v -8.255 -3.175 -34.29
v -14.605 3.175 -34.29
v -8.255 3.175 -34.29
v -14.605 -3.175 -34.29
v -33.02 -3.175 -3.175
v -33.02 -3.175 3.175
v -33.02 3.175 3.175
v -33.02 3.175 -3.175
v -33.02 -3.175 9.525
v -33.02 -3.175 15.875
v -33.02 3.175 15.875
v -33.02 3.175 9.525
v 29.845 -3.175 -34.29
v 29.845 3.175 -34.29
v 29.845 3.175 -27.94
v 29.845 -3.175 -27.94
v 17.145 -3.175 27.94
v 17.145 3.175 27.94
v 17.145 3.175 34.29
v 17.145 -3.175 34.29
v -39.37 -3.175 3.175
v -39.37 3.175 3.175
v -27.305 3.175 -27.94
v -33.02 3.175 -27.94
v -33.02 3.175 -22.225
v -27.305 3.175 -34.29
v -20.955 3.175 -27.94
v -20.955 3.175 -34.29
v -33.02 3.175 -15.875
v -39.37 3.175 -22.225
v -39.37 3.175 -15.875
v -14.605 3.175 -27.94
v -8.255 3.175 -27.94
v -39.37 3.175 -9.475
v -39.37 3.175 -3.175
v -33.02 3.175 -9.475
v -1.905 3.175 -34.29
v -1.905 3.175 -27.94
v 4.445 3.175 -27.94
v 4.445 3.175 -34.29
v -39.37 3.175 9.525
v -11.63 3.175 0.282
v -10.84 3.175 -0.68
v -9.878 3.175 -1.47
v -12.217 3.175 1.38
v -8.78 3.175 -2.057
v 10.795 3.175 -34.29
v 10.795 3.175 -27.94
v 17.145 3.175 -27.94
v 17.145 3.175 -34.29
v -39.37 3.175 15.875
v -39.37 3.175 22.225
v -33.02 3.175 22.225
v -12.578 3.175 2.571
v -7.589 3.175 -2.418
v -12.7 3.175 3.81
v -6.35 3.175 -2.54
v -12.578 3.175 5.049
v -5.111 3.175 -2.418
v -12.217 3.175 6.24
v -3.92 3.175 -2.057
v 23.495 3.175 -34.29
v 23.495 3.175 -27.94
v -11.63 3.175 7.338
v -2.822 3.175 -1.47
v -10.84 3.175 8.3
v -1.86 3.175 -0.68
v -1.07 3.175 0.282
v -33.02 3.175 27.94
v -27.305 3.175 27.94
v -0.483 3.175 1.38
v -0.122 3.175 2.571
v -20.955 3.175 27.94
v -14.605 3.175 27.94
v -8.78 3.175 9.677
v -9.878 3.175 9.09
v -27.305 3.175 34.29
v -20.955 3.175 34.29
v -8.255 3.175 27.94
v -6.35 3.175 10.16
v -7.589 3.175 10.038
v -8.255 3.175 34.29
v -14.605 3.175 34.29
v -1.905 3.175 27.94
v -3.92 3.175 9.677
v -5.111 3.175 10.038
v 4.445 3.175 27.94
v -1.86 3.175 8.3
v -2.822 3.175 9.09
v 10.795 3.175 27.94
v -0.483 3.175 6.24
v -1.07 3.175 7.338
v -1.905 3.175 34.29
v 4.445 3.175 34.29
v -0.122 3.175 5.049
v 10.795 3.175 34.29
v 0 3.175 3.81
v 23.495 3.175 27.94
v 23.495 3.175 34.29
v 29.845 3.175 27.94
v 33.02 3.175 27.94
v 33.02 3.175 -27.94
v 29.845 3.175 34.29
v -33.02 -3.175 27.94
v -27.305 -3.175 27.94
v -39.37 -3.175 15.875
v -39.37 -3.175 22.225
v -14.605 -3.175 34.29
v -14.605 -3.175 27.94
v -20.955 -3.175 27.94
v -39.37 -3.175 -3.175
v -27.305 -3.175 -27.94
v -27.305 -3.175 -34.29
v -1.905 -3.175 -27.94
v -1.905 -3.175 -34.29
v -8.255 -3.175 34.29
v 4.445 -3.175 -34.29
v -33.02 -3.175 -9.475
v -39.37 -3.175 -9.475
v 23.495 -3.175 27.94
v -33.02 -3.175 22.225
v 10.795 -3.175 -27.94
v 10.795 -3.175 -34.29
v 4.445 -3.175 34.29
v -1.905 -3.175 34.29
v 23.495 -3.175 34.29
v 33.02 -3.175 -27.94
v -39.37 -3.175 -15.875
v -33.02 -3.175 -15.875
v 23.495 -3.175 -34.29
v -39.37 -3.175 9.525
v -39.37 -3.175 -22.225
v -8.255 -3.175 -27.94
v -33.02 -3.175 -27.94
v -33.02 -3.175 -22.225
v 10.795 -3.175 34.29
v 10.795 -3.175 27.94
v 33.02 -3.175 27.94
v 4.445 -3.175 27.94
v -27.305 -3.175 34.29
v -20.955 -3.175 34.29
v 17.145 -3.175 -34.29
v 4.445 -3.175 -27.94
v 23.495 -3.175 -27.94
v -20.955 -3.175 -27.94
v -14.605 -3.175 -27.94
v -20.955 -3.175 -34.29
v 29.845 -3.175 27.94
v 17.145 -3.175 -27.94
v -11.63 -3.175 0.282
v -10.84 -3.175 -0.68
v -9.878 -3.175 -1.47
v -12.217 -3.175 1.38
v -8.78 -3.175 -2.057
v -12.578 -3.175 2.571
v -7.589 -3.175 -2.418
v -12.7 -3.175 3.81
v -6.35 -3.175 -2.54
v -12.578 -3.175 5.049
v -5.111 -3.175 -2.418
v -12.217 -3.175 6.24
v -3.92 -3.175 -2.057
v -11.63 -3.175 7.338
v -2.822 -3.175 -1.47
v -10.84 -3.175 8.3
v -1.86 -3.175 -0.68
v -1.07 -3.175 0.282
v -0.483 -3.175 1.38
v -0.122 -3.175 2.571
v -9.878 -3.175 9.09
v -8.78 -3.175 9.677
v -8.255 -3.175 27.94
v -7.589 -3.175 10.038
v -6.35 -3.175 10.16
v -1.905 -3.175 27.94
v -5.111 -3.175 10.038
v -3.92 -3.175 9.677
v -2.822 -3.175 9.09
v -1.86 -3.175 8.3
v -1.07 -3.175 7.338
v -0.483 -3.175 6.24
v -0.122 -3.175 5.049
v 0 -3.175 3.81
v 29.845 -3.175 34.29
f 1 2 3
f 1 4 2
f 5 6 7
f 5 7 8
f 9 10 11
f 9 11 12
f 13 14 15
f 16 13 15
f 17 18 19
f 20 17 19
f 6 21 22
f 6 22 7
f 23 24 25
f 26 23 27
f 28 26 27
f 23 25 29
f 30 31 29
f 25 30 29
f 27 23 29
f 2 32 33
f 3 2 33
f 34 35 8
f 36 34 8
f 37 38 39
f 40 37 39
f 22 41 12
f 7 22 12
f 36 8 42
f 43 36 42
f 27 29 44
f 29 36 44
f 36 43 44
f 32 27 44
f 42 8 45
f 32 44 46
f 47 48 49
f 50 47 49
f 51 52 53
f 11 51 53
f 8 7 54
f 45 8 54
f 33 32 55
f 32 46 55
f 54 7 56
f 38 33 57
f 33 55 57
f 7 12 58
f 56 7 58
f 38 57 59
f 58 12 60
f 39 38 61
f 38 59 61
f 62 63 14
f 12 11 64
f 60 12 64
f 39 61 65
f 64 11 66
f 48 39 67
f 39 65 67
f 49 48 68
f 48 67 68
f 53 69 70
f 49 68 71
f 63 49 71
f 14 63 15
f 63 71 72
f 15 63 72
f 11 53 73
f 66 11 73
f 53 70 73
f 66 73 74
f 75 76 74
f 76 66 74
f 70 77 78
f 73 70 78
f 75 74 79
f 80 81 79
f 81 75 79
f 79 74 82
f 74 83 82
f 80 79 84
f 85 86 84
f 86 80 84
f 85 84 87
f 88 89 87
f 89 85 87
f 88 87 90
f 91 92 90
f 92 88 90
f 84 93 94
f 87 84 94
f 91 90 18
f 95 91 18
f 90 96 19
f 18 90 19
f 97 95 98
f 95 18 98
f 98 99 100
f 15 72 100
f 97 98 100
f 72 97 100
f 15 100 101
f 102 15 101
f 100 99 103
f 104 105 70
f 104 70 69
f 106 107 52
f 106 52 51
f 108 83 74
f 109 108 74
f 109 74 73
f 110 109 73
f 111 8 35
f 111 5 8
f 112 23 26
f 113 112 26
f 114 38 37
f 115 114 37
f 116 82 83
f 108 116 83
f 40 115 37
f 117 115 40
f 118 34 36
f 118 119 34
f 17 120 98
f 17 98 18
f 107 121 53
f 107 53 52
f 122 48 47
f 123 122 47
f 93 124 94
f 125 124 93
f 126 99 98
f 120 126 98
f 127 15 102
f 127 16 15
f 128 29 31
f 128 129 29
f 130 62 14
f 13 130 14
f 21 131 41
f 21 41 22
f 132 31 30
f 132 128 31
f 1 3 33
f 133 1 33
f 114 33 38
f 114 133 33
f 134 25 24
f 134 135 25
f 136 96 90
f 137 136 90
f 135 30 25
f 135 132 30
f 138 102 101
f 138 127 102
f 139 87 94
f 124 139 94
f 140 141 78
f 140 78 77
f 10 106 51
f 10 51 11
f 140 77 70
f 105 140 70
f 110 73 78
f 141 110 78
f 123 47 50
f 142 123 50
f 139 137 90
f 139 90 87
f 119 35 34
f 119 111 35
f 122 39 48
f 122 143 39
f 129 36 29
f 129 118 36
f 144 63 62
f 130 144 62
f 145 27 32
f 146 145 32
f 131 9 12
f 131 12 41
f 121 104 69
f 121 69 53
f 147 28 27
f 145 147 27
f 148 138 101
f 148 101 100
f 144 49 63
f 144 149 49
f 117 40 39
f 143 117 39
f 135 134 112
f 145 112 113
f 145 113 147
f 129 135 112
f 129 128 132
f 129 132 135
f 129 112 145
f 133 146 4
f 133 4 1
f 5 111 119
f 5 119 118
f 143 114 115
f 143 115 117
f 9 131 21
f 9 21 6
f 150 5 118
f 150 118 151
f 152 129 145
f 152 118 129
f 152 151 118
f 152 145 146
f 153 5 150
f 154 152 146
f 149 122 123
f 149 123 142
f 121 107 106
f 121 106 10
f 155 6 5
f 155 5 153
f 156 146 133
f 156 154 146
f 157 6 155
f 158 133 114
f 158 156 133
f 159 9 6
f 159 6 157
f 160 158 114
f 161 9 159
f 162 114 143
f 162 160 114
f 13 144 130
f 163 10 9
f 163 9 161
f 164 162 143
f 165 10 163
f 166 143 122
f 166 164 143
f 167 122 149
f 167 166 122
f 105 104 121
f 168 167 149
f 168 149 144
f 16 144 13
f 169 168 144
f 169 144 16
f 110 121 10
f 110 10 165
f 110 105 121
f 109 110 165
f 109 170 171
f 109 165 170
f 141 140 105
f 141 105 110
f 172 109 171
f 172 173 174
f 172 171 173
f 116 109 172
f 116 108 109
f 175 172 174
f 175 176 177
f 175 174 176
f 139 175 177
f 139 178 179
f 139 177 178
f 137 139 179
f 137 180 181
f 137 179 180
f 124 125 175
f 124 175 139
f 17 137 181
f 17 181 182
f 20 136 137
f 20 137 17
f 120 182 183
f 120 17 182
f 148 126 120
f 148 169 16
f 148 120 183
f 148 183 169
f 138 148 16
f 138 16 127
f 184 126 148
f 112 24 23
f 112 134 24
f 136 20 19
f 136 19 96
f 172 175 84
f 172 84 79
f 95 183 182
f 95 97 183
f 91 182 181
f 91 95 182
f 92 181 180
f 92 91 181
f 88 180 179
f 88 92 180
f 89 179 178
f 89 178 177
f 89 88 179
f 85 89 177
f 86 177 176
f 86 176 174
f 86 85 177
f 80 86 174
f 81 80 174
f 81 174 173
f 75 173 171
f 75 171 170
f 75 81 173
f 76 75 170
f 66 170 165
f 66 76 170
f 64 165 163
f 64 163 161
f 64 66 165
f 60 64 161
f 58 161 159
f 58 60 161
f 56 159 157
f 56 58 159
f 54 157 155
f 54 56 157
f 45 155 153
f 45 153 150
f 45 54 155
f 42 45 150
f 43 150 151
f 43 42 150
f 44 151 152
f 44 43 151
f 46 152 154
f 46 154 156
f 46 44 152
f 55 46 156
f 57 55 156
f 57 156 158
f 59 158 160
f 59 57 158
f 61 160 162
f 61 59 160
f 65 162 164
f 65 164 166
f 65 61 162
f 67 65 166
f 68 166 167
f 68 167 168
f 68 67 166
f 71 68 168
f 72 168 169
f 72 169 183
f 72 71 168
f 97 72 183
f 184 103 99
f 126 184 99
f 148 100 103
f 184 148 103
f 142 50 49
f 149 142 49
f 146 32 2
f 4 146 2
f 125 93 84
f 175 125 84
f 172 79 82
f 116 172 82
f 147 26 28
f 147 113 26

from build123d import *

# Parameters (mm, degrees)
F0_R     = 6.35
F1_DEPTH = 3.175


with BuildPart() as f1:
    # F0 (on Front) → F1 (new body, symmetric)
    with BuildSketch(Plane.XZ):
        Polygon((33.02, -27.94), (33.02, 27.94), (29.845, 27.94), (29.845, 34.29), (23.495, 34.29), (23.495, 27.94), (17.145, 27.94), (17.145, 34.29), (10.795, 34.29), (10.795, 27.94), (4.445, 27.94), (4.445, 34.29), (-1.905, 34.29), (-1.905, 27.94), (-8.255, 27.94), (-8.255, 34.29), (-14.605, 34.29), (-14.605, 27.94), (-20.955, 27.94), (-20.955, 34.29), (-27.305, 34.29), (-27.305, 27.94), (-33.02, 27.94), (-33.02, 22.225), (-39.37, 22.225), (-39.37, 15.875), (-33.02, 15.875), (-33.02, 9.525), (-39.37, 9.525), (-39.37, 3.175), (-33.02, 3.175), (-33.02, -3.175), (-39.37, -3.175), (-39.37, -9.475044), (-33.02, -9.475044), (-33.02, -9.525), (-33.02, -15.875), (-39.37, -15.875), (-39.37, -22.225), (-33.02, -22.225), (-33.02, -27.94), (-27.305, -27.94), (-27.305, -34.29), (-20.955, -34.29), (-20.955, -27.94), (-14.605, -27.94), (-14.605, -34.29), (-8.255, -34.29), (-8.255, -27.94), (-1.905, -27.94), (-1.905, -34.29), (4.445, -34.29), (4.445, -27.94), (10.795, -27.94), (10.795, -34.29), (17.145, -34.29), (17.145, -27.94), (23.495, -27.94), (23.495, -34.29), (29.845, -34.29), (29.845, -27.94), align=None)
        with Locations((-6.35, 3.81)):
            Circle(F0_R, mode=Mode.SUBTRACT)
    extrude(amount=F1_DEPTH, both=True)


solid = f1.part
